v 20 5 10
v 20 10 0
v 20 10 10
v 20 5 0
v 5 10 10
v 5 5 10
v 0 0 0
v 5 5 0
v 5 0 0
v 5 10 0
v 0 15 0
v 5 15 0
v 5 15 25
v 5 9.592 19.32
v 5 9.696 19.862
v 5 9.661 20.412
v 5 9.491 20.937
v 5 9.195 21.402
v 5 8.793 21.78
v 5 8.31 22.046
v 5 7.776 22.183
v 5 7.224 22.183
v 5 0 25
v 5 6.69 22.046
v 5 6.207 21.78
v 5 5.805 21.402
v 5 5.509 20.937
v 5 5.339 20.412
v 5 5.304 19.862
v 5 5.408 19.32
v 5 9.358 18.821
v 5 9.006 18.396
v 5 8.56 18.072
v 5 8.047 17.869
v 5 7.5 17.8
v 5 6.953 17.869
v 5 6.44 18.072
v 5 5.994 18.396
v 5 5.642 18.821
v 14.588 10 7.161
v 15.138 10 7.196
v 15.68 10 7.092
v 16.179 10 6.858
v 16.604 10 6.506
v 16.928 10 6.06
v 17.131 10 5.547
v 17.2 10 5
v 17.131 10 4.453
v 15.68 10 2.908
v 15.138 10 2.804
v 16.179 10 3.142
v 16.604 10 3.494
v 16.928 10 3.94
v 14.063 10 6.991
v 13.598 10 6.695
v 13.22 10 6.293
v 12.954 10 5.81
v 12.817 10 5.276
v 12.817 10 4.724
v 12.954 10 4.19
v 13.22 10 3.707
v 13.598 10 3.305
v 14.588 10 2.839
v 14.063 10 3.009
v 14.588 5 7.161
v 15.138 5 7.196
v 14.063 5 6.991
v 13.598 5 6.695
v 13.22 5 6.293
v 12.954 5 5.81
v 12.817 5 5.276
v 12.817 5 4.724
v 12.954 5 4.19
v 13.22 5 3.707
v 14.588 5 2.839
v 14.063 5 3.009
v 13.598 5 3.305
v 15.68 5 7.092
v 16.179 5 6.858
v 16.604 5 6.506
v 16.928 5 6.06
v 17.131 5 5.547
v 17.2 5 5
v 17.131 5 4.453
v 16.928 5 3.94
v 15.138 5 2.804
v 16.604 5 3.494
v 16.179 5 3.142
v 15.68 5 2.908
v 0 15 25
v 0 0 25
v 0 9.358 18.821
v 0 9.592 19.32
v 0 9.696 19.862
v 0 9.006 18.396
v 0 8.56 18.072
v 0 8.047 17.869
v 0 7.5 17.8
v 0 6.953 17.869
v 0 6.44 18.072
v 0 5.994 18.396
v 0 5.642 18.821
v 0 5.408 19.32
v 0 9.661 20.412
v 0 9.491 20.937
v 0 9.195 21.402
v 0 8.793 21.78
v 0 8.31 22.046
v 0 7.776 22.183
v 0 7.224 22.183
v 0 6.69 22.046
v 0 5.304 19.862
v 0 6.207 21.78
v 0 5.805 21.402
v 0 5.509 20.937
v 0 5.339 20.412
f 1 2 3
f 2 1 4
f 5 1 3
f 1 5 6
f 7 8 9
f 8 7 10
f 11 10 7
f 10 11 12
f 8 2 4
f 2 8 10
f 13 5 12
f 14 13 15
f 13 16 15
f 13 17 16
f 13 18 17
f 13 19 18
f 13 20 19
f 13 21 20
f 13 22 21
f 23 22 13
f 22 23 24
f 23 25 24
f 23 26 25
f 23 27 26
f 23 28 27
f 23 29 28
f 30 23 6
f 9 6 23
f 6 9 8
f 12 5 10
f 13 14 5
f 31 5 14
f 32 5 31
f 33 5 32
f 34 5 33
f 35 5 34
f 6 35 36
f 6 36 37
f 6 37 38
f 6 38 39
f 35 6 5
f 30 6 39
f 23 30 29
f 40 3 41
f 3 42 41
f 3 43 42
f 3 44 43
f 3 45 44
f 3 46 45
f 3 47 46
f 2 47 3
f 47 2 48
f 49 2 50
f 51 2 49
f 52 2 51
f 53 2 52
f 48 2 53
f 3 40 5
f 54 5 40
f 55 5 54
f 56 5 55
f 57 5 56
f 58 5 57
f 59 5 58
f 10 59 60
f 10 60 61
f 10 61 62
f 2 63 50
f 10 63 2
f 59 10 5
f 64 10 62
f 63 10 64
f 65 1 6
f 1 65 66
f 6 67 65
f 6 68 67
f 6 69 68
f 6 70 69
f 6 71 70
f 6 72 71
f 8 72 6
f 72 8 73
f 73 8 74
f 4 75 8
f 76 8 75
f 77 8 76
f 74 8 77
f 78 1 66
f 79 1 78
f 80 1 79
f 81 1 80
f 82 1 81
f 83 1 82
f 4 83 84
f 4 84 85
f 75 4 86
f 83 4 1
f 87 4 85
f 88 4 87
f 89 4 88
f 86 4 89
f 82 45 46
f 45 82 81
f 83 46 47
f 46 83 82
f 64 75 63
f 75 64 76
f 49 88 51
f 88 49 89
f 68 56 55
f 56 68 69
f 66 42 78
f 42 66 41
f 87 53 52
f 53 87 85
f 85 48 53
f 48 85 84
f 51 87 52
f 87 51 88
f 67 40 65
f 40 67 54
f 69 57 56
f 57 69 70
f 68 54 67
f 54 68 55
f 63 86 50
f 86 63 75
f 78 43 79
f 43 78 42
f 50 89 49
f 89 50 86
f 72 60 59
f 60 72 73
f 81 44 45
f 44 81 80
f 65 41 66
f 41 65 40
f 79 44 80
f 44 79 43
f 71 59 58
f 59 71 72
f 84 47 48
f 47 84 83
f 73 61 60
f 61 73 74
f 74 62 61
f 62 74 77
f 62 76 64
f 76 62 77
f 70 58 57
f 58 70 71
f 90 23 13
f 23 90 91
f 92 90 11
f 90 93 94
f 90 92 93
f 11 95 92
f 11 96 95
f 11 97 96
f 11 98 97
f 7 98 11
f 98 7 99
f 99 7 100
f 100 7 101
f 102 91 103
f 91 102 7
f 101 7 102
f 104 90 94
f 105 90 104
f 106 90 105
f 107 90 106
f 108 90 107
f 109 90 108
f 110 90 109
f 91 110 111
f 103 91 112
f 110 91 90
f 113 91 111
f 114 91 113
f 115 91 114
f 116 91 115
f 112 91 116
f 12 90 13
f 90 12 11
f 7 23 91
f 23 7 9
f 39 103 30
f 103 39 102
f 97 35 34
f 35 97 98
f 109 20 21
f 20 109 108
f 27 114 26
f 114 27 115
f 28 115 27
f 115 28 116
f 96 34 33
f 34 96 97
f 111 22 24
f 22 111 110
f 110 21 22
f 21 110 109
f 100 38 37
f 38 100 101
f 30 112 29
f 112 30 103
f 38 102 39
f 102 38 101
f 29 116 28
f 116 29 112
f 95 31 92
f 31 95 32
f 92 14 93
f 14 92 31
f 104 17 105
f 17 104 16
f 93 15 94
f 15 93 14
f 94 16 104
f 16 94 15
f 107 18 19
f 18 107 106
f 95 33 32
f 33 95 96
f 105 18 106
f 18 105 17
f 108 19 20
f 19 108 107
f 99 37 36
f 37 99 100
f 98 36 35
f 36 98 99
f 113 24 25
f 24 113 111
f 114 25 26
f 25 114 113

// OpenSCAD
translate([5, 5, 0]) {
    difference(){
    cube([15, 5, 10], false);
    translate([10, 7.5, 5]) {
        rotate([90, 0, 0]) {
            cylinder(h = 10, r = 2.2, $fn=25); // Otwór w mniejszym sześcianie
        }
    }
    }
}
difference() {
    cube([5, 15, 25], false);
    translate([0, 7.5, 20]) {
        rotate([90, 90, 90]) {
            cylinder(h = 15, r = 2.2, $fn=25); 
        }
    }
}
